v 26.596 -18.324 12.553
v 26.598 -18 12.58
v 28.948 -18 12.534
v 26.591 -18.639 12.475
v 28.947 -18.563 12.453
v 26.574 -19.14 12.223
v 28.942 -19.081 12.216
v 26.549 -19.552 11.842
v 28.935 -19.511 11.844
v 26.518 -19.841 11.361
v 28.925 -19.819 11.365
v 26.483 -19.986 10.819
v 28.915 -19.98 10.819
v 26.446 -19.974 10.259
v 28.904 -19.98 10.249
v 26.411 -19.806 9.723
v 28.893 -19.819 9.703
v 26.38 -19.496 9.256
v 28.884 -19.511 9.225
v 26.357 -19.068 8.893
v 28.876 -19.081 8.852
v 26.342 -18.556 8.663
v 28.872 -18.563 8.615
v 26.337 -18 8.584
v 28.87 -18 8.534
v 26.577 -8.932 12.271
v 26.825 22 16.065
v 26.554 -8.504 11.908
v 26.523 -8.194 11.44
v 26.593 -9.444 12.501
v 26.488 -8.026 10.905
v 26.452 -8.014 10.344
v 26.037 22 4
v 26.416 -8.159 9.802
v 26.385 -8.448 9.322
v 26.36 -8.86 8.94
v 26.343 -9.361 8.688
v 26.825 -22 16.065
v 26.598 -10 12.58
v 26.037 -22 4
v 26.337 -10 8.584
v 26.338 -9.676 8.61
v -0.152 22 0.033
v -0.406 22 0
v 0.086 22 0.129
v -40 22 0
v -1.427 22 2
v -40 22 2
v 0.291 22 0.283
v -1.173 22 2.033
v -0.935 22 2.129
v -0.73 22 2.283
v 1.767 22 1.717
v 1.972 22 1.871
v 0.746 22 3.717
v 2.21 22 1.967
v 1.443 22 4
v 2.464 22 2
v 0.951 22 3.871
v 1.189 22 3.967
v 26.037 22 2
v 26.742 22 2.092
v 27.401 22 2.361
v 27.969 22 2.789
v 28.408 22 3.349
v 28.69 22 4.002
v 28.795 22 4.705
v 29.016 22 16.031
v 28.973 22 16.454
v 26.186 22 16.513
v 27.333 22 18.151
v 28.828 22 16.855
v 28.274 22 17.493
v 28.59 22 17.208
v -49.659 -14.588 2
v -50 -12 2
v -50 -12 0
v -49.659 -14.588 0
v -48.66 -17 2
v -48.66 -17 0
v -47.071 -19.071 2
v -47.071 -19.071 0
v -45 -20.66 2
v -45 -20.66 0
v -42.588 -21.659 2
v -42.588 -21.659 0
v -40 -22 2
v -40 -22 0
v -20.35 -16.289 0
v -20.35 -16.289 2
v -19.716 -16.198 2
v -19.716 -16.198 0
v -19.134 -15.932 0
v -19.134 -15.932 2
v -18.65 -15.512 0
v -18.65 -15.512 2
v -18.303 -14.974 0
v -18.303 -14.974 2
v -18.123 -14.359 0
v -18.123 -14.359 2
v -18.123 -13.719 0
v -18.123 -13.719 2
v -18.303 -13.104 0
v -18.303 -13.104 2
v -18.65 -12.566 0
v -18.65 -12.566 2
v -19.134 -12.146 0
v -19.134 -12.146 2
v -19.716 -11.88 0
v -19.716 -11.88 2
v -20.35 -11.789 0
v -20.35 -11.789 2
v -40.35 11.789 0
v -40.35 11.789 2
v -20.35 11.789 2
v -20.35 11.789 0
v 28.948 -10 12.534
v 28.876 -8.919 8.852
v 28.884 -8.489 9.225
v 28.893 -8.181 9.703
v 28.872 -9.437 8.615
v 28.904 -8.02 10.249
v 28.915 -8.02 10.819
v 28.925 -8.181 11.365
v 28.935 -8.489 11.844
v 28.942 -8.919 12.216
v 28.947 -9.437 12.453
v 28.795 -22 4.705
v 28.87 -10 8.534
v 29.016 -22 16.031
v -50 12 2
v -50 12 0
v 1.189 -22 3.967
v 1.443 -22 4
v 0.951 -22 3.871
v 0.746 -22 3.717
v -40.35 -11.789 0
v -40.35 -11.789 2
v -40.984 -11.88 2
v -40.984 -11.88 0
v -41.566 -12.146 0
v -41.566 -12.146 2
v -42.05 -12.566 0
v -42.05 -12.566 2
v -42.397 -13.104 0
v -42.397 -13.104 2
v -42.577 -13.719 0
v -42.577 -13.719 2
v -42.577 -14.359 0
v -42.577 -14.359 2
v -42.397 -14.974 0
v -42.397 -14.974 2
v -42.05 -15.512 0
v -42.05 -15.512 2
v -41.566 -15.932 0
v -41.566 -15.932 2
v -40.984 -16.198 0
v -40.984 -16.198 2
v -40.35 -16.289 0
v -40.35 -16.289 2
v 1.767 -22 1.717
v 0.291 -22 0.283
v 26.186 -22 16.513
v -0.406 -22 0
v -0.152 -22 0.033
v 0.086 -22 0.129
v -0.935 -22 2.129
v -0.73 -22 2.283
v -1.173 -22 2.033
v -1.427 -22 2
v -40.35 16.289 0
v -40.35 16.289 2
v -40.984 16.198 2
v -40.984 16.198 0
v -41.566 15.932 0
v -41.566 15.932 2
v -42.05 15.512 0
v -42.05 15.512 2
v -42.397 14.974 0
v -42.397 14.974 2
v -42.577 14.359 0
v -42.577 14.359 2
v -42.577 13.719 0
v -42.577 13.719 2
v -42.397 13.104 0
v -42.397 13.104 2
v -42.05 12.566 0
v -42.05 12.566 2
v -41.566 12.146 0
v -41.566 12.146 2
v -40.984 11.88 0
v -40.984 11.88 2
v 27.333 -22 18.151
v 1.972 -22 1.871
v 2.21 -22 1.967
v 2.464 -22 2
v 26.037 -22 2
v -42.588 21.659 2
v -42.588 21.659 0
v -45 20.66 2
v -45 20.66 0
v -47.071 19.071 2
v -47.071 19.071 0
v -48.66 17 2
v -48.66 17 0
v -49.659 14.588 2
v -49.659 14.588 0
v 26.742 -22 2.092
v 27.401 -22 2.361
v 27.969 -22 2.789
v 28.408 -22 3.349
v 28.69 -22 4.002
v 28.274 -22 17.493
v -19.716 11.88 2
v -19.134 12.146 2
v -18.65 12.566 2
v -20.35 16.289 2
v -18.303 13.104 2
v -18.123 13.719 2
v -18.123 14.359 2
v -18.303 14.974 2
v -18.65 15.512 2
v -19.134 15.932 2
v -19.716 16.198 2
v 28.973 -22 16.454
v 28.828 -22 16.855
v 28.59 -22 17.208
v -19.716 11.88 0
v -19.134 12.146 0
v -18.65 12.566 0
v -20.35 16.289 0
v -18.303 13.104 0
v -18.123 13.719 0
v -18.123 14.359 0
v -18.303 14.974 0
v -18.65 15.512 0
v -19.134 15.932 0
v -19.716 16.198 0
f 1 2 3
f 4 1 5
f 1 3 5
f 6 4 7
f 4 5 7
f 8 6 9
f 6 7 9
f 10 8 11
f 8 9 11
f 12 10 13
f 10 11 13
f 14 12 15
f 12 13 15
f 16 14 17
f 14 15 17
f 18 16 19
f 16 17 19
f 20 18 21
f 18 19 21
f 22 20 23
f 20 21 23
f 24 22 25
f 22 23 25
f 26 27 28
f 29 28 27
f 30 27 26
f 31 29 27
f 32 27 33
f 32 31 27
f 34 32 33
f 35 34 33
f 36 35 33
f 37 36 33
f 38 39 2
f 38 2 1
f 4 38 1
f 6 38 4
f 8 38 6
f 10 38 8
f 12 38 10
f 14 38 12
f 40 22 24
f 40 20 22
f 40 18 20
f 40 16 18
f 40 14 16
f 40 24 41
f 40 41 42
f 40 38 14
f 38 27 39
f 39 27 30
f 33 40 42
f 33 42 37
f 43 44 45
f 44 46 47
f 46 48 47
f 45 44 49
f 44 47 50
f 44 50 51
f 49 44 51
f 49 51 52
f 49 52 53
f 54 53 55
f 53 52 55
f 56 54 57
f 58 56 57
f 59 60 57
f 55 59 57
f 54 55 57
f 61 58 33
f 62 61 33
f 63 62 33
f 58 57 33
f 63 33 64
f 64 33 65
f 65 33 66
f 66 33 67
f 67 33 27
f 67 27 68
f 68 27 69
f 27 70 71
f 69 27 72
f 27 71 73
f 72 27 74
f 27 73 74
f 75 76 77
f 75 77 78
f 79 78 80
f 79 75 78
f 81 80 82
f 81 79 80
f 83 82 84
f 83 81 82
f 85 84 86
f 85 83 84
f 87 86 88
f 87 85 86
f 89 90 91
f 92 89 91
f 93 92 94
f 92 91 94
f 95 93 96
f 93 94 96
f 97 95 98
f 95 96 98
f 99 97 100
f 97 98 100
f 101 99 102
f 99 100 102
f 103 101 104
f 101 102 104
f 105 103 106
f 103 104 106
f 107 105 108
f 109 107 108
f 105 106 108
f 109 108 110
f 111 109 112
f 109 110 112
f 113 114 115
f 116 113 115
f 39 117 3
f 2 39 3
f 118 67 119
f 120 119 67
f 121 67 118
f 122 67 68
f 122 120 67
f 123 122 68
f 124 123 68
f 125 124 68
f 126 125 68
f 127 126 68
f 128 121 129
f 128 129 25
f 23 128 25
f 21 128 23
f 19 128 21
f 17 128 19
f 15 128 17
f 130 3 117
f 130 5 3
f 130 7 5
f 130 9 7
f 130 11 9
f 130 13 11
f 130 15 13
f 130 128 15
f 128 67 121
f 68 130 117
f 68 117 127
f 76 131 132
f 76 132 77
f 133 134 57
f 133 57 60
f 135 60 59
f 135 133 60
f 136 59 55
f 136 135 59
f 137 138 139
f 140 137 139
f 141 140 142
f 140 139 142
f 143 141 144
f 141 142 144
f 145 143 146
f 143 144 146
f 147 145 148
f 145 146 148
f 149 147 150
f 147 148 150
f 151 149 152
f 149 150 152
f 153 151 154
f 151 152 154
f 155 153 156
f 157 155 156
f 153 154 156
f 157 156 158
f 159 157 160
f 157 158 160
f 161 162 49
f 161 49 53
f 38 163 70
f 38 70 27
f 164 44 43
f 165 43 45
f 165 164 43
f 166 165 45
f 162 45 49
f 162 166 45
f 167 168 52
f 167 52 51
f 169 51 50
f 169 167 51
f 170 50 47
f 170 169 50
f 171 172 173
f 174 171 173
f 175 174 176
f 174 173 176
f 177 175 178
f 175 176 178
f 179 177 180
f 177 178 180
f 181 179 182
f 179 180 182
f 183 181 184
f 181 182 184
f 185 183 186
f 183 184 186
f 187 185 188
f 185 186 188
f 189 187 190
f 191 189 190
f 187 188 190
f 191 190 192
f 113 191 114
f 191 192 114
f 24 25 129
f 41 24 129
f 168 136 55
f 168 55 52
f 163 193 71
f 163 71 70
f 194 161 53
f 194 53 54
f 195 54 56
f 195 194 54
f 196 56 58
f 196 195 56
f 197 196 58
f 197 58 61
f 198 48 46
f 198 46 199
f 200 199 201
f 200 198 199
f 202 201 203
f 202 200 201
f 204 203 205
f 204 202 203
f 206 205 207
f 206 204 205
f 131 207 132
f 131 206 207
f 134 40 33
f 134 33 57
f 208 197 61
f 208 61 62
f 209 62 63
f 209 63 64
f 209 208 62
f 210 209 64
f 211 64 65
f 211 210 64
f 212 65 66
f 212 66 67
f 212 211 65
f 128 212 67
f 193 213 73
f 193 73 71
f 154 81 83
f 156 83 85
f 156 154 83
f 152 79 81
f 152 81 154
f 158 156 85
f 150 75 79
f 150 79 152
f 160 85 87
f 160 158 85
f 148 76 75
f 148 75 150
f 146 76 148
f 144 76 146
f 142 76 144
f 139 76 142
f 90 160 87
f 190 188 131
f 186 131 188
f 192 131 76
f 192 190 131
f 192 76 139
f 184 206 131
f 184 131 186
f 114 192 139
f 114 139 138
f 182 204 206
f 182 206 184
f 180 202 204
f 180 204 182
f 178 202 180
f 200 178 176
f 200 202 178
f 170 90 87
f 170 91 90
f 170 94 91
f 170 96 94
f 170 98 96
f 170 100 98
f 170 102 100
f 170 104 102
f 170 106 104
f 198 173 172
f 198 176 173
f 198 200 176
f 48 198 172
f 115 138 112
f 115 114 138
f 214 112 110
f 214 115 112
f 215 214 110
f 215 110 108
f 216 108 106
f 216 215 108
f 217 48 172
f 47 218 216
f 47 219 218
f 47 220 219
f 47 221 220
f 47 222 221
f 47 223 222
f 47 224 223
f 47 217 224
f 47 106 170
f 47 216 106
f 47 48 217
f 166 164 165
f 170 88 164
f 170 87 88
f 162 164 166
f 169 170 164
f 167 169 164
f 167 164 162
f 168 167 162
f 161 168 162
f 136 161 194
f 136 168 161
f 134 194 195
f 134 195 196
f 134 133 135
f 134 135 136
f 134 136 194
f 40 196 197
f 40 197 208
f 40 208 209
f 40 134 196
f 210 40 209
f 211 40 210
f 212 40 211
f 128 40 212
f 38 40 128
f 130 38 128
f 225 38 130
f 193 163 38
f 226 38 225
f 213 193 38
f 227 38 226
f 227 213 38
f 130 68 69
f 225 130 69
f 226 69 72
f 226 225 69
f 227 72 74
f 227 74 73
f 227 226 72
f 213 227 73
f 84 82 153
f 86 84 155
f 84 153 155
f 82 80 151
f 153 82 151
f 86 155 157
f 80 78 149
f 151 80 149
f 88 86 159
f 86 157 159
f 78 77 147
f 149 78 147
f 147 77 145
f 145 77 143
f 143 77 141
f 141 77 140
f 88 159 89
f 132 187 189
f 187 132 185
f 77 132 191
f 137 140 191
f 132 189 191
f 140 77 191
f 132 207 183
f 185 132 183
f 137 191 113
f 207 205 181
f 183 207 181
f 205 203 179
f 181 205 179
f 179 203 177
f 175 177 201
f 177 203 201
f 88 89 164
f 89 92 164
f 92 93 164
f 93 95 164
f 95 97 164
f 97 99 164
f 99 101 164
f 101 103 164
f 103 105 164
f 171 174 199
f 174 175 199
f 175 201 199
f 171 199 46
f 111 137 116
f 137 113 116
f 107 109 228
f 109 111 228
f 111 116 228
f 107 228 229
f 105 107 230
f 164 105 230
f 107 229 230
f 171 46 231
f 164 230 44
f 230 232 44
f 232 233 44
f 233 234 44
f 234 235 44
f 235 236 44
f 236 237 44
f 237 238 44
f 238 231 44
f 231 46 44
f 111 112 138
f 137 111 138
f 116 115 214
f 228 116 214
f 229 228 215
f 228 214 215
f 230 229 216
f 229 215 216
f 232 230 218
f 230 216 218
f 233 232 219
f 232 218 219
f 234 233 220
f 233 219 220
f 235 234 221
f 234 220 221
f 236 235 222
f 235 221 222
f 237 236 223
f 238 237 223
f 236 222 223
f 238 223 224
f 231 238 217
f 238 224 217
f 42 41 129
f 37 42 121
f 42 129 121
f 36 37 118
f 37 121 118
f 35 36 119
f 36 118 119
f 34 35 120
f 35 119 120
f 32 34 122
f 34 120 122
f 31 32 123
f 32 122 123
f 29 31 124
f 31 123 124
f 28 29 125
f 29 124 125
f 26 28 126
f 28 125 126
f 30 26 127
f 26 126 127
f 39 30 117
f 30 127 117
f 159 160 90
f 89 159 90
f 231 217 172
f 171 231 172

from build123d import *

# Parameters (mm, degrees)
F1_DEPTH = 22
F3_DEPTH = 2
F5_DEPTH = 25
F7_DEPTH = 25


with BuildPart() as f1:
    # F0 (on Front) → F1 (new body, symmetric)
    with BuildSketch(Plane.XZ):
        with BuildLine():
            Line((-40, 0), (-0.4058661959, 0))
            ThreePointArc((-0.4058661959, 0), (-0.0297944203, 0.073409465), (0.2910628996, 0.2828599608))
            Line((0.2910628996, 0.2828599608), (1.7669371004, 1.7171400392))
            ThreePointArc((1.7669371004, 1.7171400392), (2.0877944203, 1.926590535), (2.4638661959, 2))
            Line((2.4638661959, 2), (26.037, 2))
            ThreePointArc((26.037, 2), (27.9687843496, 2.7891547709), (28.7954749436, 4.705176349))
            Line((28.7954749436, 4.705176349), (29.016465998, 16.0310205539))
            ThreePointArc((29.016465998, 16.0310205539), (28.8276722638, 16.8546583092), (28.2736767263, 17.4927109486))
            Line((28.2736767263, 17.4927109486), (27.3333525812, 18.1512658075))
            Line((27.3333525812, 18.1512658075), (26.1860444646, 16.5130704329))
            Line((26.1860444646, 16.5130704329), (26.8254471929, 16.0652655182))
            Line((26.8254471929, 16.0652655182), (26.037, 4))
            Line((26.037, 4), (1.4428661959, 4))
            ThreePointArc((1.4428661959, 4), (1.0667944203, 3.926590535), (0.7459371004, 3.7171400392))
            Line((0.7459371004, 3.7171400392), (-0.7299371004, 2.2828599608))
            ThreePointArc((-0.7299371004, 2.2828599608), (-1.0507944203, 2.073409465), (-1.4268661959, 2))
            Line((-1.4268661959, 2), (-40, 2))
            Line((-40, 2), (-40, 0))
        make_face()
    extrude(amount=F1_DEPTH, both=True)

    # F2 (on face) → F3 (join)
    with BuildSketch(Plane.XY.offset(2)):
        with BuildLine():
            Line((-50, 12), (-50, -12))
            ThreePointArc((-50, -12), (-47.0710678119, -19.0710678119), (-40, -22))
            Line((-40, -22), (-40, 22))
            ThreePointArc((-40, 22), (-47.0710678119, 19.0710678119), (-50, 12))
        make_face()
    extrude(amount=-F3_DEPTH)

    # F4 (on face) → F5 (cut)
    with BuildSketch(Plane.XY.offset(2)):
        with BuildLine():
            ThreePointArc((-40.35, -11.789), (-42.6, -14.039), (-40.35, -16.289))
            Line((-40.35, -16.289), (-20.35, -16.289))
            ThreePointArc((-20.35, -16.289), (-18.1, -14.039), (-20.35, -11.789))
            Line((-20.35, -11.789), (-40.35, -11.789))
        make_face()
        with BuildLine():
            ThreePointArc((-40.35, 16.289), (-42.6, 14.039), (-40.35, 11.789))
            Line((-40.35, 11.789), (-20.35, 11.789))
            ThreePointArc((-20.35, 11.789), (-18.1, 14.039), (-20.35, 16.289))
            Line((-20.35, 16.289), (-40.35, 16.289))
        make_face()
    extrude(amount=-F5_DEPTH, mode=Mode.SUBTRACT)

    # F6 (on face) → F7 (cut)
    with BuildSketch(Plane(origin=(28.6927430868, 0, -0.5598557981), x_dir=(0, 1, 0), z_dir=(0.9998096932, 0, -0.0195083911))):
        with BuildLine():
            Line((-9.9999997095, 13.096034309), (-17.9999997095, 13.096034309))
            ThreePointArc((-17.9999997095, 13.096034309), (-20, 11.0960344543), (-18, 9.096034309))
            Line((-18, 9.096034309), (-9.9999997095, 9.096034309))
            ThreePointArc((-9.9999997095, 9.096034309), (-7.9999997095, 11.096034309), (-9.9999997095, 13.096034309))
        make_face()
    extrude(amount=-F7_DEPTH, mode=Mode.SUBTRACT)


solid = f1.part
